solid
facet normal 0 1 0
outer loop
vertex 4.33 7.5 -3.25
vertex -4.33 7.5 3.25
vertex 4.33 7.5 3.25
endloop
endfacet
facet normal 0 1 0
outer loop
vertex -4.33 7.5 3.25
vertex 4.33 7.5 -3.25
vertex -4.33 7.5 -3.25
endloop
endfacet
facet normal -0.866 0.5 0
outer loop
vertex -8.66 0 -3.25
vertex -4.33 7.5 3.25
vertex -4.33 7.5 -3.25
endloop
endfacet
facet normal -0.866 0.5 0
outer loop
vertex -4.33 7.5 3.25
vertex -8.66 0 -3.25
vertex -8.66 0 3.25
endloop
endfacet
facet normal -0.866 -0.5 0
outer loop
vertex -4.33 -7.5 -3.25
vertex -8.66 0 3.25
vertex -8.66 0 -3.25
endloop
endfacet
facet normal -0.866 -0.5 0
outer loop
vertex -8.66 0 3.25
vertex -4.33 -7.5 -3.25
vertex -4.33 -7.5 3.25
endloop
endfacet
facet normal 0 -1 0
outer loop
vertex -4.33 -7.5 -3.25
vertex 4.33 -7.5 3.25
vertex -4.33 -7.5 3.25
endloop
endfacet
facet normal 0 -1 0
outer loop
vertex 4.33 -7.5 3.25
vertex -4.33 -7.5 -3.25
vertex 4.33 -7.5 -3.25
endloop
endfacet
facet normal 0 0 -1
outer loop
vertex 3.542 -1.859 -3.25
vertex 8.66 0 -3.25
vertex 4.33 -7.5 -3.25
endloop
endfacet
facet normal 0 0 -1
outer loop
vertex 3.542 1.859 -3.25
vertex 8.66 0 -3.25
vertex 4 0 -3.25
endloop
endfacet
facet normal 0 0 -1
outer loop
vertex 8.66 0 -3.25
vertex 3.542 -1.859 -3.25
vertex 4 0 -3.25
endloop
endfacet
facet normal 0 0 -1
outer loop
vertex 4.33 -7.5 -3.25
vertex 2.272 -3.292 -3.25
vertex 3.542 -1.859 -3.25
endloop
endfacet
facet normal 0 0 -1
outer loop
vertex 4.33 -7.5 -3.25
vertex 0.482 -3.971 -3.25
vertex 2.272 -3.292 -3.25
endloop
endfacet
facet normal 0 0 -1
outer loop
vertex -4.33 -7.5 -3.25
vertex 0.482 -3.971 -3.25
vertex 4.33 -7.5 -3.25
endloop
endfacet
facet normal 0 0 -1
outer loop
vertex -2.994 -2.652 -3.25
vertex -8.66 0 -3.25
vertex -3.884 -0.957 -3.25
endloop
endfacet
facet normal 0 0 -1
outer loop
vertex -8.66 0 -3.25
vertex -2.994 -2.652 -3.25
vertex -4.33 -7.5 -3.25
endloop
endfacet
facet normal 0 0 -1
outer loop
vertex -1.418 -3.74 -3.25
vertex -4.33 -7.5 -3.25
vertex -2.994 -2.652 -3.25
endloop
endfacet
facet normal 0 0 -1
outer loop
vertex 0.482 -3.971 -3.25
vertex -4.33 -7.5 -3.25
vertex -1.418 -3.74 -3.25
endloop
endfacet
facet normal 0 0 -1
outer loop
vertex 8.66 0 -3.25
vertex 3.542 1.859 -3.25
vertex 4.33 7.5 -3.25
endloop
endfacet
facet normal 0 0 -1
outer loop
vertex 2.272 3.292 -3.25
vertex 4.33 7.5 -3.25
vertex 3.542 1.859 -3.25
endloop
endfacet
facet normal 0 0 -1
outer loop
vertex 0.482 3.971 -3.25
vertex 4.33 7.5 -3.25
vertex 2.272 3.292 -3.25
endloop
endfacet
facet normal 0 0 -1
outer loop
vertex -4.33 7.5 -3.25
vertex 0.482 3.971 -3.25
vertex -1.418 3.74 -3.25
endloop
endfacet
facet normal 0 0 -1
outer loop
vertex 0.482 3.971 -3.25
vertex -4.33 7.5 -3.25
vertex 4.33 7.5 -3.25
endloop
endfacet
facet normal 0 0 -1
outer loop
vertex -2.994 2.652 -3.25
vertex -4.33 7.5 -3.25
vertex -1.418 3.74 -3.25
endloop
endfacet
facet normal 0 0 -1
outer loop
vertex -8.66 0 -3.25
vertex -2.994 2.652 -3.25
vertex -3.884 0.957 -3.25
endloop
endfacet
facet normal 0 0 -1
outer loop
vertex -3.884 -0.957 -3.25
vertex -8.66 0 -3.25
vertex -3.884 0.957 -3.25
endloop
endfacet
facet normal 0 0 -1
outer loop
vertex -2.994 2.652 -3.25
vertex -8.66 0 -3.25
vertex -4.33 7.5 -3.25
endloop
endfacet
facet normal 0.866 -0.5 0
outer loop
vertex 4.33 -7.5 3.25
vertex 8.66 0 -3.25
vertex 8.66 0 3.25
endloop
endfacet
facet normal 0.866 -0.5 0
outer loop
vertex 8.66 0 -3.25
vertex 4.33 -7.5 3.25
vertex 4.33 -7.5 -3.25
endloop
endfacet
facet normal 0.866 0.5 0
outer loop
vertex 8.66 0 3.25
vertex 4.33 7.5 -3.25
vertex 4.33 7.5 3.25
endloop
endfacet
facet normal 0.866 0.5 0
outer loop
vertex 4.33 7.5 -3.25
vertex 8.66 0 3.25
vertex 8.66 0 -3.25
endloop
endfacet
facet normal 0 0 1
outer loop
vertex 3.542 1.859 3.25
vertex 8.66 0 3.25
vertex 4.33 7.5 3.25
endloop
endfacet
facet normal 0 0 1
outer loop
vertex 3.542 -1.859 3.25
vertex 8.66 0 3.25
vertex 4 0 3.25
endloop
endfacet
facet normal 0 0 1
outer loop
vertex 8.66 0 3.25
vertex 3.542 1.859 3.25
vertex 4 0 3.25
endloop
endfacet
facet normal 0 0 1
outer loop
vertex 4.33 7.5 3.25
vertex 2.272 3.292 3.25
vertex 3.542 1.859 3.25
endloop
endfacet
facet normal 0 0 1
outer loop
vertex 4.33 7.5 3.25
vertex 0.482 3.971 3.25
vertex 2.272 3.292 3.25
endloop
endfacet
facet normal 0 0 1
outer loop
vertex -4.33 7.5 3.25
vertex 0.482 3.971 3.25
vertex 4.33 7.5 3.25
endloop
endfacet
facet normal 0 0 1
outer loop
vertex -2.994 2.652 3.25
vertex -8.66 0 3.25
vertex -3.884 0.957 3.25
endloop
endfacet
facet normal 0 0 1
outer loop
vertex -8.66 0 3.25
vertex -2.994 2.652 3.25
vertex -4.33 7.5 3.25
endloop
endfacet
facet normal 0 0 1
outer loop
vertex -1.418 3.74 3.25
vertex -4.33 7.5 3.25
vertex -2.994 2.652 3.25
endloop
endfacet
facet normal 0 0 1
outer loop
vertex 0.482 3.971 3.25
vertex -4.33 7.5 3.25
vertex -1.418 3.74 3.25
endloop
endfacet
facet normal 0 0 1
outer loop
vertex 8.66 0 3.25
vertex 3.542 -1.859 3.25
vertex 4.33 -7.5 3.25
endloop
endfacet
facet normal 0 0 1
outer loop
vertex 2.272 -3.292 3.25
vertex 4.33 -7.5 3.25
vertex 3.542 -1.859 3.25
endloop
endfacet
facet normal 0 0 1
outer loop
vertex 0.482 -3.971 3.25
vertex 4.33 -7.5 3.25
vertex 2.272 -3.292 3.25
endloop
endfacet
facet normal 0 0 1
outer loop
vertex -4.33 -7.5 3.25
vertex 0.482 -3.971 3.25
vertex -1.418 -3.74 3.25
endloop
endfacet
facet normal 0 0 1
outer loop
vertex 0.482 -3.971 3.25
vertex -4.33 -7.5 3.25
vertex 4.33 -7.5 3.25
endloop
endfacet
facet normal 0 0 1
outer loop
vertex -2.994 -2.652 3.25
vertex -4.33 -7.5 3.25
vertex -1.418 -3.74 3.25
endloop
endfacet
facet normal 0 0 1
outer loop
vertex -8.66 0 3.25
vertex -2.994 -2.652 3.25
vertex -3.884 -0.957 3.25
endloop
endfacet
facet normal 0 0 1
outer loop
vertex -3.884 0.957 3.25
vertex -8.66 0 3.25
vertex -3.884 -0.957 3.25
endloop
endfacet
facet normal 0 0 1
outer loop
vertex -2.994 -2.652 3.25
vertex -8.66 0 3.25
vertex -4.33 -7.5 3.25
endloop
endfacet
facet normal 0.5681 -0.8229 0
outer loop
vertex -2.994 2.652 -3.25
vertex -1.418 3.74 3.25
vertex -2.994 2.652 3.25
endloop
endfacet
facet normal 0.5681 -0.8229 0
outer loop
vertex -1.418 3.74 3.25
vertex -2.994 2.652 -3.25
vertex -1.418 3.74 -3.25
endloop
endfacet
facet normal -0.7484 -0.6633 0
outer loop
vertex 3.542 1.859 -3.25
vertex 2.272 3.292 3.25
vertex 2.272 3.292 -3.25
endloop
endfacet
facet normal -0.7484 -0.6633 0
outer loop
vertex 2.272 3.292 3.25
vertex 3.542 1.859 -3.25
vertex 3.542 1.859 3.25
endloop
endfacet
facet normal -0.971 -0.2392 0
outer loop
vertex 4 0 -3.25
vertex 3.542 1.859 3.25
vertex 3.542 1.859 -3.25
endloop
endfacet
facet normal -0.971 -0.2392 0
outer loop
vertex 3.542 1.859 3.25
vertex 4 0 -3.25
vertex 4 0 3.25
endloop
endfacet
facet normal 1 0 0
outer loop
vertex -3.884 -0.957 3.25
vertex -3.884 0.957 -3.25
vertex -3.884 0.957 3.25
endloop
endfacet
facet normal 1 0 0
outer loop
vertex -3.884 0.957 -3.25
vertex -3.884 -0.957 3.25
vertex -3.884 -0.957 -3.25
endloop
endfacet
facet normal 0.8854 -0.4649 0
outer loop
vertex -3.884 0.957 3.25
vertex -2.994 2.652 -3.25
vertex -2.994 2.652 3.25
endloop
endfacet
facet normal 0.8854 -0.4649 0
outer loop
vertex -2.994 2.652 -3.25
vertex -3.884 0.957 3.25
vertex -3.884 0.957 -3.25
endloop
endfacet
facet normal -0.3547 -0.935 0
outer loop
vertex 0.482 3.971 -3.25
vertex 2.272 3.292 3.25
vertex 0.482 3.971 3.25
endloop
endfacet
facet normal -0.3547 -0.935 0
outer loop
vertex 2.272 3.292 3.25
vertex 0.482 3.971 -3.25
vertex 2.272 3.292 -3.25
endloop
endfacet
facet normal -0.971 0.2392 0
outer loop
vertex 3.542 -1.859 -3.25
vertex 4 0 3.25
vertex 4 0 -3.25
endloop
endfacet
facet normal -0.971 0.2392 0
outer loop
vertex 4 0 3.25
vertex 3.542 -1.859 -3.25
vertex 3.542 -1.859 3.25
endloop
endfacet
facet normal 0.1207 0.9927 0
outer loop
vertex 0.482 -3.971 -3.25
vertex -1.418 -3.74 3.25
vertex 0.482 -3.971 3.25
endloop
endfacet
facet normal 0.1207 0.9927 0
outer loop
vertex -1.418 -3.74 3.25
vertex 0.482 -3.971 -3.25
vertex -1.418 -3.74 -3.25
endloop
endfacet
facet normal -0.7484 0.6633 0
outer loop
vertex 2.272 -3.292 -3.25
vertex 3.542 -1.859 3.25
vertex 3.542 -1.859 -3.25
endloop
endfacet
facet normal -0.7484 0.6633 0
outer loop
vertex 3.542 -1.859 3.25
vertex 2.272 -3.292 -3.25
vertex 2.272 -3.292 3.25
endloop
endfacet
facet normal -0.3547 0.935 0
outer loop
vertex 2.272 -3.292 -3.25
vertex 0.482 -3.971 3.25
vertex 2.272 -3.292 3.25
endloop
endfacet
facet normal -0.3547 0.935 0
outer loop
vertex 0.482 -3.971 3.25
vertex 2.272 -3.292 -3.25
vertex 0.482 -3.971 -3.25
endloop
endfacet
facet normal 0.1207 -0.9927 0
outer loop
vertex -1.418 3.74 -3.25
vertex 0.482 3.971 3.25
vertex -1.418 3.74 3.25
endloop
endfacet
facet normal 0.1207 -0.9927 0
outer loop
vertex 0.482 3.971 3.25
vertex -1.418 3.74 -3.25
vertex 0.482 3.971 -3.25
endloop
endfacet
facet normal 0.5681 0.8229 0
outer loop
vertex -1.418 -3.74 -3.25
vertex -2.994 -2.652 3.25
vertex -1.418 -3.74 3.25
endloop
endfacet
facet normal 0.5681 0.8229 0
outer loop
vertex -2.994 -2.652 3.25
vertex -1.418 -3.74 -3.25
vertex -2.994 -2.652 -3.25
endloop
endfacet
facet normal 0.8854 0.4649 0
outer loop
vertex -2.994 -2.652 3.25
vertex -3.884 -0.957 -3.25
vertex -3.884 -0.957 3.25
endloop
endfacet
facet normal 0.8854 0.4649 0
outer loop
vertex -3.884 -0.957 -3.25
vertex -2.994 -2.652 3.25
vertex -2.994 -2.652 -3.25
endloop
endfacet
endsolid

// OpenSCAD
// Parameters
thread_diameter = 8.0; //[4.0:16.0:0.1]
across_flats = 15.0; //[7.5:30.0:0.1]
thickness = 6.5; //[3.25:13.0:0.1]
hole_clearance = 0.0; //[0.0:1.0:0.05]
overlap = 0.8; //[0.5:2.0:0.1]

// Hexagonal Nut - complete geometry
module hex_nut() {
  color("DimGray") {
    // Hexagonal body
    linear_extrude(height = thickness, center = true) {
      polygon(points = [
        [across_flats/sqrt(3), 0],
        [across_flats/(2*sqrt(3)), across_flats/2],
        [-across_flats/(2*sqrt(3)), across_flats/2],
        [-across_flats/sqrt(3), 0],
        [-across_flats/(2*sqrt(3)), -across_flats/2],
        [across_flats/(2*sqrt(3)), -across_flats/2]
      ]);
    }
  }
}

// Through-hole for the nut
module through_hole() {
  color("Silver") {
    cylinder(r = (thread_diameter + hole_clearance) / 2, h = thickness + 2 * overlap, center = true);
  }
}

// Nut and Washer - complete assembly
module nut_and_washer() {
  difference() {
    hex_nut();
    through_hole();
  }
}

// Assembly
module assembly() {
  nut_and_washer();
}

assembly();
